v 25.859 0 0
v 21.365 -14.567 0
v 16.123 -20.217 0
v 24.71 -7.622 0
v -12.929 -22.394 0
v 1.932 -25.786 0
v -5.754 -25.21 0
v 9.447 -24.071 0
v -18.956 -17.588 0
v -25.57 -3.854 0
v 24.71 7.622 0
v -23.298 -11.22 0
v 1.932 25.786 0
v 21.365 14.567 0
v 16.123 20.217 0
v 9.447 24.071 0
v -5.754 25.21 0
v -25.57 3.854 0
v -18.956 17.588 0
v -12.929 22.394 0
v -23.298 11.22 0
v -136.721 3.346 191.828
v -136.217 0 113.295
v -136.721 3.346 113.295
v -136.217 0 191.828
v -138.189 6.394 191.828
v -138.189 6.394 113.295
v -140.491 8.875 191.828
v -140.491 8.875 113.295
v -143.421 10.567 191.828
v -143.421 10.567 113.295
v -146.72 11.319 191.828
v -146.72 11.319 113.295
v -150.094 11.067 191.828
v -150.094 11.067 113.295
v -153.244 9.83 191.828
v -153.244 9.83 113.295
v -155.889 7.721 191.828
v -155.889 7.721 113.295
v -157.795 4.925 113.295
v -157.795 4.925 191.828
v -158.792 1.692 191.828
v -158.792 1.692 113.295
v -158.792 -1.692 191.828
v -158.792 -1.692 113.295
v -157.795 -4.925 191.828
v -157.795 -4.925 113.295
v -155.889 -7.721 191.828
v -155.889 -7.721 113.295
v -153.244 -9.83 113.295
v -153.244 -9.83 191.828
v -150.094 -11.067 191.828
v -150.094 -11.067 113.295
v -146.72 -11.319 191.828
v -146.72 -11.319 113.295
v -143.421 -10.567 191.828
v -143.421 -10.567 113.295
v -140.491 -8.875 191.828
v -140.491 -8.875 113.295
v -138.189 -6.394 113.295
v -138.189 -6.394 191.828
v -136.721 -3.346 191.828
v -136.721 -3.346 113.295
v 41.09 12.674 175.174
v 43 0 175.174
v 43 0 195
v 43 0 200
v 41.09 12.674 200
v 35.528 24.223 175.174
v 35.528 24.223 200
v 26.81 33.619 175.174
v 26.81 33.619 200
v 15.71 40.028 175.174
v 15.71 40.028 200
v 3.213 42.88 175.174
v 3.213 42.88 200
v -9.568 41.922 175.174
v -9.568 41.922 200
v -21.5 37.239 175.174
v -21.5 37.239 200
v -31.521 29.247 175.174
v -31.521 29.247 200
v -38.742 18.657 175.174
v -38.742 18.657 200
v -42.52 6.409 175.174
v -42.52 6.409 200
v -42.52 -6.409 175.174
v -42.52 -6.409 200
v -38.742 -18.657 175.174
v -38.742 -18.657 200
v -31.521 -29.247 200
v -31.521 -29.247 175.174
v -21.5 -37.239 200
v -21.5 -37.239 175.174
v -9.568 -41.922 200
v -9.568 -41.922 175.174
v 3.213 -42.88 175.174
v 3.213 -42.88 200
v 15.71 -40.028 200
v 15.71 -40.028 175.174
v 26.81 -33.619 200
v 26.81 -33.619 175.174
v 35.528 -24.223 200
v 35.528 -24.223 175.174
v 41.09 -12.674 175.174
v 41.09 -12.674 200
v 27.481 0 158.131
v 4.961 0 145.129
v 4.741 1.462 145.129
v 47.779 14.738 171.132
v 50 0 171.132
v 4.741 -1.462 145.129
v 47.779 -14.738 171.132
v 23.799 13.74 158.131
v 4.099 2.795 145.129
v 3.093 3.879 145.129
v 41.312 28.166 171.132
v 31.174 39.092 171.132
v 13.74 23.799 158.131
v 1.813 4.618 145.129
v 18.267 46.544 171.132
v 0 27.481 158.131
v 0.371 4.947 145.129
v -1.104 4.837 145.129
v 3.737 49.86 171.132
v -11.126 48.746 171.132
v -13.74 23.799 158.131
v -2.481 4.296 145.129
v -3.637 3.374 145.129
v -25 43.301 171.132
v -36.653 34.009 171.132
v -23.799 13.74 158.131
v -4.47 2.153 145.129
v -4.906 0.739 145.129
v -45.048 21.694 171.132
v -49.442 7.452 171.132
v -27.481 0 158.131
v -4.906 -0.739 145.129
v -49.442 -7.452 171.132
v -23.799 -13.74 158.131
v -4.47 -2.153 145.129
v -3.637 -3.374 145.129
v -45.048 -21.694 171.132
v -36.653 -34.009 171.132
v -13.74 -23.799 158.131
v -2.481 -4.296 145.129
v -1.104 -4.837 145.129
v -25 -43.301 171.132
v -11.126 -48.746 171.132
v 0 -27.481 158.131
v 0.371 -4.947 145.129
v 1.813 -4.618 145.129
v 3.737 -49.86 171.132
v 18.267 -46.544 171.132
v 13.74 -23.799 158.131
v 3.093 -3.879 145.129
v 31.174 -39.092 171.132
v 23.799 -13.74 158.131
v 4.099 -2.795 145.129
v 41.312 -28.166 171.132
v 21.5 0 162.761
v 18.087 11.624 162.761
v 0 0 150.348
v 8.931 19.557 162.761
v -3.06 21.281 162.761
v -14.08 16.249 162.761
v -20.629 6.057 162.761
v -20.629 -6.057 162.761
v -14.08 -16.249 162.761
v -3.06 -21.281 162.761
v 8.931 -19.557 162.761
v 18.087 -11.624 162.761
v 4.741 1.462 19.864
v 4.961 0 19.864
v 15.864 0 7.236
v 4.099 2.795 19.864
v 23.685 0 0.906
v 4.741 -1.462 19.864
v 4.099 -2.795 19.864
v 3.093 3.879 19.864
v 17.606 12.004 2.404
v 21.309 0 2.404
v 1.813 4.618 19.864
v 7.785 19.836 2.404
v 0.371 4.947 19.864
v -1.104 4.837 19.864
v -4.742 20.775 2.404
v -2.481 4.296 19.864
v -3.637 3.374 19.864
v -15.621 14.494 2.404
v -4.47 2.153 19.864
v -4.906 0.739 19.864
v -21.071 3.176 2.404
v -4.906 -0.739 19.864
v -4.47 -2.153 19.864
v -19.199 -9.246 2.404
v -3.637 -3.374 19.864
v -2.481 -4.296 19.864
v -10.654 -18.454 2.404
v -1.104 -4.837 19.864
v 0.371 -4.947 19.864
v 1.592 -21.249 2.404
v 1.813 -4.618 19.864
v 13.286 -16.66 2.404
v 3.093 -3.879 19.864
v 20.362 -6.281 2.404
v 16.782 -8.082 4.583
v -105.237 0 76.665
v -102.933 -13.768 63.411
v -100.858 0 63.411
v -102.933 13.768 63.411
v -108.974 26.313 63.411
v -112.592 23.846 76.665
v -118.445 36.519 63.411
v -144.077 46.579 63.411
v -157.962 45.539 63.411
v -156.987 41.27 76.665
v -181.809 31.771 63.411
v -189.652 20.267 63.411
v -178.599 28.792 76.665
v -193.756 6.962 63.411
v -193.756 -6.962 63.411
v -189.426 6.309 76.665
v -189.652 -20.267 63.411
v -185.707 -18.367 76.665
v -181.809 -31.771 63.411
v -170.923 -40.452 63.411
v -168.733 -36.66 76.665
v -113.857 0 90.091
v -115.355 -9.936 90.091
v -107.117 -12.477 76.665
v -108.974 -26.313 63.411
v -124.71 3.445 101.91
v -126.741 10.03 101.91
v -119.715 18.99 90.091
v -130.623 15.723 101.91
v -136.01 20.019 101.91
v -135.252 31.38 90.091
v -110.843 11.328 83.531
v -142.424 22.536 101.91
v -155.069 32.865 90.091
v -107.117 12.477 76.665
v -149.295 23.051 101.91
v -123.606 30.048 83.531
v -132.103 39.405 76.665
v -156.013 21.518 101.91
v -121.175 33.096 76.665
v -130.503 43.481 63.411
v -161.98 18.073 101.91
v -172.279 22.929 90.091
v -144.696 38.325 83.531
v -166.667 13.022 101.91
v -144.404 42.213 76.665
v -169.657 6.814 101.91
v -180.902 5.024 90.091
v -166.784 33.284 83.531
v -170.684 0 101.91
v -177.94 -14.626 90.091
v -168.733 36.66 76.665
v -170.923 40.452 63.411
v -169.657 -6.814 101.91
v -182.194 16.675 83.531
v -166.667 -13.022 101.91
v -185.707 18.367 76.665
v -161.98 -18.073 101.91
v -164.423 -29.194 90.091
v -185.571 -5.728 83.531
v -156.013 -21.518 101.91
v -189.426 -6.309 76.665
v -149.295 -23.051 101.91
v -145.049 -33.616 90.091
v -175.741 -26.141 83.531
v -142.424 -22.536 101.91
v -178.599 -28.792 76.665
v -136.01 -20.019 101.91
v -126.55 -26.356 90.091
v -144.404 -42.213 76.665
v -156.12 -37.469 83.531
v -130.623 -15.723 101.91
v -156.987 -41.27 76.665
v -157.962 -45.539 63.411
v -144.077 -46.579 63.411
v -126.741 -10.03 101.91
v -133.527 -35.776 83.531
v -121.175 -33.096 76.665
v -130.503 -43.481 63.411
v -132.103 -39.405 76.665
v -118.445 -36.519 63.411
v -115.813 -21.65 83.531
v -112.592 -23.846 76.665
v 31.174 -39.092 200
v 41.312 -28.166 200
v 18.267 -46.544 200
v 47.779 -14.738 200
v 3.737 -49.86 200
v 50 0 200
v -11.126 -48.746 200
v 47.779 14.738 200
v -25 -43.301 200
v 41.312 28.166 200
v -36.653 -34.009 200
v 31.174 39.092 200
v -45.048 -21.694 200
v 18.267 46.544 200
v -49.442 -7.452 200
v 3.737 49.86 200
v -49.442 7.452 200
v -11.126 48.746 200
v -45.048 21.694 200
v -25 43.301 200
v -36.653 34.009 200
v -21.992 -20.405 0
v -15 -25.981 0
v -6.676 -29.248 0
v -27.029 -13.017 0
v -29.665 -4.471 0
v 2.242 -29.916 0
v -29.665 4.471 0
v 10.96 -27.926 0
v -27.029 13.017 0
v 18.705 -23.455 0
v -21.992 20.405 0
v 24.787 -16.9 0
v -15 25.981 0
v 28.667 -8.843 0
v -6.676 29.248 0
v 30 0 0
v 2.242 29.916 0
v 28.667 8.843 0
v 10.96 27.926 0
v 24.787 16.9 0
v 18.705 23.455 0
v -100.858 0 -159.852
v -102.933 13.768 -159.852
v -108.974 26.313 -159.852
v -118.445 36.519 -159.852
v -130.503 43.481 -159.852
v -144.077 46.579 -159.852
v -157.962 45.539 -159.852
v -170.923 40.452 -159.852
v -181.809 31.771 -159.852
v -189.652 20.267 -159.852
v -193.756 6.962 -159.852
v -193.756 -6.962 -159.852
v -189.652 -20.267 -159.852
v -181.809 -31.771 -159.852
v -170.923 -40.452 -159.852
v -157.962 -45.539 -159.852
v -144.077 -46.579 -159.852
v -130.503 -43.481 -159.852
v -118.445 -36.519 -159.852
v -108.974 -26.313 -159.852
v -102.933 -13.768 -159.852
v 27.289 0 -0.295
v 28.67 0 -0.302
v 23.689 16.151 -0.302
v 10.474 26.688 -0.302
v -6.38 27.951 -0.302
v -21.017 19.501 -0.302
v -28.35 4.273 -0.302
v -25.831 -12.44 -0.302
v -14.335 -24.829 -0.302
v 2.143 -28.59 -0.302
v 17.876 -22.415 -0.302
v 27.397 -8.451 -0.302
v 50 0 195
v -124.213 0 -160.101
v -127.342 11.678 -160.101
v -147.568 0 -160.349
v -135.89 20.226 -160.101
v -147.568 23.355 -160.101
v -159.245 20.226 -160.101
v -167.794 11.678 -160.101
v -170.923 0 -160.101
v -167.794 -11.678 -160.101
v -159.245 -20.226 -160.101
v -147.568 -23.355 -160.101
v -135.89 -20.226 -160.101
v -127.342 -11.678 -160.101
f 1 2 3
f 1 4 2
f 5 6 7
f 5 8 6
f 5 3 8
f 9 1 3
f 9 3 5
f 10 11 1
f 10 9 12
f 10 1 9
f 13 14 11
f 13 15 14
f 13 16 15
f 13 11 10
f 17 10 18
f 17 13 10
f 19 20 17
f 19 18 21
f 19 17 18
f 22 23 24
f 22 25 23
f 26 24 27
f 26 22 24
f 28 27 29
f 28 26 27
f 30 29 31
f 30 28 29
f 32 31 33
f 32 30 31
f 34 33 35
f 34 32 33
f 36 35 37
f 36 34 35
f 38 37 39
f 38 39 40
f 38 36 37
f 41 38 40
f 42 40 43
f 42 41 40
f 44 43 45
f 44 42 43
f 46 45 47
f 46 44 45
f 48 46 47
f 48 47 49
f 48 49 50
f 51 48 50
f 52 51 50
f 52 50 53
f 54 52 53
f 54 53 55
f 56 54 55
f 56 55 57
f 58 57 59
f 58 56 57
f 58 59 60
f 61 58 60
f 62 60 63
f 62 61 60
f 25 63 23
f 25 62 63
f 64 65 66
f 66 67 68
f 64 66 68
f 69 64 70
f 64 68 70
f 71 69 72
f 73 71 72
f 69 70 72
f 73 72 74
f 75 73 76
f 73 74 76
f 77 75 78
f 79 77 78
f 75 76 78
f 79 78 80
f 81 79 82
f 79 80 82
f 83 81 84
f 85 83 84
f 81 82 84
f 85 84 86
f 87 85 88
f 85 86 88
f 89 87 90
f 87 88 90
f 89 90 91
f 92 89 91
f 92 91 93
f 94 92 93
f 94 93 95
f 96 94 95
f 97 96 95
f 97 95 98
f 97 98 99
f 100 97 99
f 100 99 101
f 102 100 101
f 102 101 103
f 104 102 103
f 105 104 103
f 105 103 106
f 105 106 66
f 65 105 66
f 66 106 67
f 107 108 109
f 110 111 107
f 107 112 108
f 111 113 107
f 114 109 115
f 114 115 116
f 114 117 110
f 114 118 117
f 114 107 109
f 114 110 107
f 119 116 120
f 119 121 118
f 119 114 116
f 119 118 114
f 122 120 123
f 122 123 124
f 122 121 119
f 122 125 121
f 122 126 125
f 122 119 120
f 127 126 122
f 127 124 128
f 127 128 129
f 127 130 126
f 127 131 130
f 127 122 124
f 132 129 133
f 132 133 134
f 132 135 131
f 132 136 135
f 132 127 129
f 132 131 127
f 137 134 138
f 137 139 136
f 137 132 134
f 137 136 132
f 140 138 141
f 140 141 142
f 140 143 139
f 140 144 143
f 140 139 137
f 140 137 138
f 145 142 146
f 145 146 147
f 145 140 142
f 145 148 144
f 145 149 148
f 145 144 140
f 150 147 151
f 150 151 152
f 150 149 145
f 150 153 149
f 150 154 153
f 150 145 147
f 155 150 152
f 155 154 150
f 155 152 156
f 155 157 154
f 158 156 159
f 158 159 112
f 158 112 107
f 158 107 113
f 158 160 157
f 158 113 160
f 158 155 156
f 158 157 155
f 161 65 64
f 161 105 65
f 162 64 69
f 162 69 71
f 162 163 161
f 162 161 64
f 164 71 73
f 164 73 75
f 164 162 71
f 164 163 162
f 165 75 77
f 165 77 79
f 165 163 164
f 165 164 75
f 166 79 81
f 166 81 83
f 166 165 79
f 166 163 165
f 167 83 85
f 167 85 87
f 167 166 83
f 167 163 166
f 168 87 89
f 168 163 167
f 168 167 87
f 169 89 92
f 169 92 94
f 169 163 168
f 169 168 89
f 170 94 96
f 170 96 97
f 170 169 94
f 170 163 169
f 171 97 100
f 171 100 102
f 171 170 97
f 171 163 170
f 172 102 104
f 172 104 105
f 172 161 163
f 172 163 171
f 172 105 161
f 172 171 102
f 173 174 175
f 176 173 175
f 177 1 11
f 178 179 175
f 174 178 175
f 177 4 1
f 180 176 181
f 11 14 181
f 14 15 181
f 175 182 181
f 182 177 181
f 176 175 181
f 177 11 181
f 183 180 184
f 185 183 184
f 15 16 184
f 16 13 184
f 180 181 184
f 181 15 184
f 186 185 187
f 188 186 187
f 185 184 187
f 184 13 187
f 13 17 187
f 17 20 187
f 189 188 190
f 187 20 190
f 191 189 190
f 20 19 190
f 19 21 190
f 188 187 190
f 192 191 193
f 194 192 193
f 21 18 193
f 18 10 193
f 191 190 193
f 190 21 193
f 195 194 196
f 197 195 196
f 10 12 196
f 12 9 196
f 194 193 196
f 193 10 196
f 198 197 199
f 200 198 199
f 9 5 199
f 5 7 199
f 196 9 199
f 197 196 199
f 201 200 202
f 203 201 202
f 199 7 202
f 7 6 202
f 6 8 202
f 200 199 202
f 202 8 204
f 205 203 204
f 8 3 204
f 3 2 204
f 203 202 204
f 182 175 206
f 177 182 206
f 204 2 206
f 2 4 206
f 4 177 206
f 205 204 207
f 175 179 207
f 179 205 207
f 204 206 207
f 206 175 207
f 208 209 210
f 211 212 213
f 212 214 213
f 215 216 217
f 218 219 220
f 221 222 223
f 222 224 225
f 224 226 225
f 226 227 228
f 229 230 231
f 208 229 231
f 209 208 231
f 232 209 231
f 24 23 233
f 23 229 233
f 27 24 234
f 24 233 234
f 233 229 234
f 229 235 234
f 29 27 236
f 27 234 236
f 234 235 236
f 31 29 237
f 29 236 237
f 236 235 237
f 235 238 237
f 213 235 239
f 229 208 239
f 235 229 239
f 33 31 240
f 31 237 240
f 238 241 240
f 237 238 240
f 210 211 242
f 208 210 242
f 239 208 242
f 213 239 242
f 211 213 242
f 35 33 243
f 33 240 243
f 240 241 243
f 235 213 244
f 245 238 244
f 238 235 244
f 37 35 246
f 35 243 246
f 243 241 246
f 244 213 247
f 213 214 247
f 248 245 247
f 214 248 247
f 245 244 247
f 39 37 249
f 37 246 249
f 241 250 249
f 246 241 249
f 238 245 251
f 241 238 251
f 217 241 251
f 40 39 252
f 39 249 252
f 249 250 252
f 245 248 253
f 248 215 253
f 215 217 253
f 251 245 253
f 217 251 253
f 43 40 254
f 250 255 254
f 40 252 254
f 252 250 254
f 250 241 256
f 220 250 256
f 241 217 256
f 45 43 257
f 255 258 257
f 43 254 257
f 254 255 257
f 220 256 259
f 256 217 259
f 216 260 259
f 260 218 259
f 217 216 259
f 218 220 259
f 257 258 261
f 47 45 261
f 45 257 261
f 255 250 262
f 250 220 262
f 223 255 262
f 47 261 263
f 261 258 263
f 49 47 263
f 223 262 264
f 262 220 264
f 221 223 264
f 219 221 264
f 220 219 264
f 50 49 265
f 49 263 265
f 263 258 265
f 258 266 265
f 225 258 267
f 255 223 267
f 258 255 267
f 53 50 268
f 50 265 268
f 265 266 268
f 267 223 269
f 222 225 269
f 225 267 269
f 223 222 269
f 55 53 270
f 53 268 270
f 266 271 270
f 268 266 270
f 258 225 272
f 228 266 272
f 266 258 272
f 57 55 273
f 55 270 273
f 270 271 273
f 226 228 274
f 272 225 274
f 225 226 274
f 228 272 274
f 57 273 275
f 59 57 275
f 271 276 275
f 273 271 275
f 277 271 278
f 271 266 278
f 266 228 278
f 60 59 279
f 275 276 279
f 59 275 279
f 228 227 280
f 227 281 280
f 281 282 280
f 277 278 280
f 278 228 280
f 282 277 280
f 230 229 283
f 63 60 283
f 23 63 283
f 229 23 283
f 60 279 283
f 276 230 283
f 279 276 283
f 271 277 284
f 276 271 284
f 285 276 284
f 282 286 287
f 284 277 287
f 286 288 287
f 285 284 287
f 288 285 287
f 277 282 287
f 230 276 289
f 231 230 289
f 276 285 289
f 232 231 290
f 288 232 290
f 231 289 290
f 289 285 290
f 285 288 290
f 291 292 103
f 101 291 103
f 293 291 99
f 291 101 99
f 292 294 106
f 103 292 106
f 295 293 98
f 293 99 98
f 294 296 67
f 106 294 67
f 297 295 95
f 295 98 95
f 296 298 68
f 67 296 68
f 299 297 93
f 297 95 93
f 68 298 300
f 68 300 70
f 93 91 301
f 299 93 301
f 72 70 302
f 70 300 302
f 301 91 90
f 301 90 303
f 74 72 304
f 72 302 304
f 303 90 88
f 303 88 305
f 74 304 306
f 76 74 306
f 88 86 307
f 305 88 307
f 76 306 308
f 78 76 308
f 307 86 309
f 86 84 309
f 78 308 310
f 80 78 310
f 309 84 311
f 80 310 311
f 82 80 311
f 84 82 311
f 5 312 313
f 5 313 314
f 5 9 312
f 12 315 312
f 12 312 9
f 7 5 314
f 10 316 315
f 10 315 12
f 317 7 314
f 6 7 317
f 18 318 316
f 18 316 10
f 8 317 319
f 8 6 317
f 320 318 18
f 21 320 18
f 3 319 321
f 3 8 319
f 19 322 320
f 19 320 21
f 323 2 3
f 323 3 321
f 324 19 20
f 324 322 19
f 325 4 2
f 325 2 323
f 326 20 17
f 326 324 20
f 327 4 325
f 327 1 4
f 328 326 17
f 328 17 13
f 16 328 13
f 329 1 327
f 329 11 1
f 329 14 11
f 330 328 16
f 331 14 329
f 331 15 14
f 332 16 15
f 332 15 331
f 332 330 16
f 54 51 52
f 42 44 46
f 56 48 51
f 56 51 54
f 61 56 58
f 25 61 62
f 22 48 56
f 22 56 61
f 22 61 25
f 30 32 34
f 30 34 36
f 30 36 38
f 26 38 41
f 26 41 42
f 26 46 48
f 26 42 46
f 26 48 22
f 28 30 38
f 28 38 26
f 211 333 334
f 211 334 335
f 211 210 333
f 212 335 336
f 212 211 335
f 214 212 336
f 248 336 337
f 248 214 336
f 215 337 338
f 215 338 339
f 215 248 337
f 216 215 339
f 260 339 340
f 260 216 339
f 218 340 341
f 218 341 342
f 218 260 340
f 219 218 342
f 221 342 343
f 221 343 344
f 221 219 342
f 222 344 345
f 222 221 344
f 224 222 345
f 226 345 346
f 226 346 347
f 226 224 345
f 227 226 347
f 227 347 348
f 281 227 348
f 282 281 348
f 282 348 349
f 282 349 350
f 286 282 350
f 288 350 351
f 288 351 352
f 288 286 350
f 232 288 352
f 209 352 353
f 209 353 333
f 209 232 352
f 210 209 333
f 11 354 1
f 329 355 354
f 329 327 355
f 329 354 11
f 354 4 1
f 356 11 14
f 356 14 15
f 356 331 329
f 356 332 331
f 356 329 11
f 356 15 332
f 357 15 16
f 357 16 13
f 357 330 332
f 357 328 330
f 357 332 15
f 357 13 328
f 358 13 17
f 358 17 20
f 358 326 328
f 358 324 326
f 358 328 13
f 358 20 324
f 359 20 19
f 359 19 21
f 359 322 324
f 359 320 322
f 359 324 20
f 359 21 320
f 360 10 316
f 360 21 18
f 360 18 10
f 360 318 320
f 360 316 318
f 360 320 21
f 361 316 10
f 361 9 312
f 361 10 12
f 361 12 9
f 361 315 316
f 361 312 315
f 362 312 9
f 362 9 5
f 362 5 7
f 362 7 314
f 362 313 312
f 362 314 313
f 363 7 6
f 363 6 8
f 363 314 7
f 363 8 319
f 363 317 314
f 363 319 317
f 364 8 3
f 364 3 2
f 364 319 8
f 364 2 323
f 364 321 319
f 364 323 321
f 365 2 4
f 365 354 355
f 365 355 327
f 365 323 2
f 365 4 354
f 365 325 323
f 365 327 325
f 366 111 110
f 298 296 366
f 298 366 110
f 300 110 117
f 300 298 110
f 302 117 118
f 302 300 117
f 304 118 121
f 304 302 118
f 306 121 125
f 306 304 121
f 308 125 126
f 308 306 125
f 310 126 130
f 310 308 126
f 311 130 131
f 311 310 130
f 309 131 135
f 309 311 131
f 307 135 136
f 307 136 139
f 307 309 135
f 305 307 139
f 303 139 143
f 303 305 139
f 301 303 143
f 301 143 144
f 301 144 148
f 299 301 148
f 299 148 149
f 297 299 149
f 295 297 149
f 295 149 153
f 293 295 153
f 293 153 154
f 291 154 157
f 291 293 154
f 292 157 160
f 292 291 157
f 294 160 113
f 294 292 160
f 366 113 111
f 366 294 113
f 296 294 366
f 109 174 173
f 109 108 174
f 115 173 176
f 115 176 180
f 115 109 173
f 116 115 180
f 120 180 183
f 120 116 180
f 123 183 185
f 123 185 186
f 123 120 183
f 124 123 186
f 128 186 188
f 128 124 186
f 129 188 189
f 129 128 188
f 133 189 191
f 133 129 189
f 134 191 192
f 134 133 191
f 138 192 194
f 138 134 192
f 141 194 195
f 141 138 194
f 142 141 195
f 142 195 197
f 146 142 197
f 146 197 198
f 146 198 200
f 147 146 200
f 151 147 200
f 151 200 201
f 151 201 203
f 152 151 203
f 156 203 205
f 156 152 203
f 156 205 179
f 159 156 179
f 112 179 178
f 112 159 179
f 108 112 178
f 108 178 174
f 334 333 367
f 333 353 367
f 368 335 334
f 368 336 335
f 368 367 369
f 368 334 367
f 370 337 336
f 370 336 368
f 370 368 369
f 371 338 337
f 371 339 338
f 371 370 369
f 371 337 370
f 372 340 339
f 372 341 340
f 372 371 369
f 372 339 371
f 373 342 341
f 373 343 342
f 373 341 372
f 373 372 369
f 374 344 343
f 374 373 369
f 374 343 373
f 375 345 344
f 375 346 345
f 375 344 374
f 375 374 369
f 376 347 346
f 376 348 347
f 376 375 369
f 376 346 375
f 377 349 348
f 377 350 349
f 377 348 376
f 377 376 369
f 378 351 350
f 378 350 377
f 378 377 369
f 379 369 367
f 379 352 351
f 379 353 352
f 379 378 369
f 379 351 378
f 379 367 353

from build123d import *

# Parameters (mm, degrees)
F0_W = 6.9999985397
F0_H = 5


with BuildPart() as f1:
    # F0 (on Front) → F1 (revolve)
    with BuildSketch(Plane.XZ):
        with BuildLine():
            Line((30, 0), (25.8585092875, 0))
            add(Edge.make_bspline(
                [(25.8585092875, 0), (27.3116843389, -0.4316274096), (28.6974805174, -0.4630992086), (30, 0)],
                knots=[0.2014445689, 0.2014445689, 0.2014445689, 0.2014445689, 0.2489747507, 0.2489747507, 0.2489747507, 0.2489747507], degree=3))
        make_face()
    revolve(axis=Axis((0, 0, 75.1739375817), (0, 0, 1)))


with BuildPart() as f1b:
    # F0 (on Front) → F1, piece 2 (revolve)
    with BuildSketch(Plane.XZ):
        with BuildLine():
            Line((0, 142.264973081), (0, 0))
            Line((0, 0), (25.8585092875, 0))
            add(Edge.make_bspline(
                [(4.9611562863, 19.8637973517), (12.3303766325, 10.8465700925), (19.6995969787, 1.8293428333), (25.8585092875, 0)],
                knots=[0, 0, 0, 0, 0.2014445689, 0.2014445689, 0.2014445689, 0.2014445689], degree=3))
            Line((4.9611562863, 19.8637973517), (4.9611562863, 145.1292979984))
            Line((4.9611562863, 145.1292979984), (0, 142.264973081))
        make_face()
        Polygon((0, 150.3478751635), (0, 142.264973081), (4.9611562863, 145.1292979984), (50, 171.1324865405), (50, 195), (43.0000014603, 195), (43.0000014603, 175.1739375817), align=None)
        with Locations((46.5000007302, 197.5)):
            Rectangle(F0_W, F0_H)
    revolve(axis=Axis((0, 0, 75.1739375817), (0, 0, 1)))


with BuildPart() as f3:
    # F2 (on Front) → F3 (revolve)
    with BuildSketch(Plane.XZ):
        with BuildLine():
            Line((-147.5678905943, 191.8281465769), (-147.5678905943, -160.3494286537))
            Line((-147.5678905943, -160.3494286537), (-100.8578097971, -159.8519305577))
            Line((-100.8578097971, -159.8519305577), (-100.8578097971, 44.280486039))
            Line((-100.8578097971, 44.280486039), (-100.8578097971, 63.4109550445))
            add(Edge.make_bspline(
                [(-136.2166553736, 113.2949069142), (-120.2705357988, 98.2116867745), (-104.3244162241, 83.1284666349), (-100.8578097971, 63.4109550445)],
                knots=[0, 0, 0, 0, 0.4565026562, 0.4565026562, 0.4565026562, 0.4565026562], degree=3))
            Line((-136.2166553736, 113.2949069142), (-136.2166553736, 191.8281465769))
            Line((-136.2166553736, 191.8281465769), (-147.5678905943, 191.8281465769))
        make_face()
    revolve(axis=Axis((-147.5678905943, 0, 15.7393589616), (0, 0, 1)))


solid = Compound([f1.part, f1b.part, f3.part])
